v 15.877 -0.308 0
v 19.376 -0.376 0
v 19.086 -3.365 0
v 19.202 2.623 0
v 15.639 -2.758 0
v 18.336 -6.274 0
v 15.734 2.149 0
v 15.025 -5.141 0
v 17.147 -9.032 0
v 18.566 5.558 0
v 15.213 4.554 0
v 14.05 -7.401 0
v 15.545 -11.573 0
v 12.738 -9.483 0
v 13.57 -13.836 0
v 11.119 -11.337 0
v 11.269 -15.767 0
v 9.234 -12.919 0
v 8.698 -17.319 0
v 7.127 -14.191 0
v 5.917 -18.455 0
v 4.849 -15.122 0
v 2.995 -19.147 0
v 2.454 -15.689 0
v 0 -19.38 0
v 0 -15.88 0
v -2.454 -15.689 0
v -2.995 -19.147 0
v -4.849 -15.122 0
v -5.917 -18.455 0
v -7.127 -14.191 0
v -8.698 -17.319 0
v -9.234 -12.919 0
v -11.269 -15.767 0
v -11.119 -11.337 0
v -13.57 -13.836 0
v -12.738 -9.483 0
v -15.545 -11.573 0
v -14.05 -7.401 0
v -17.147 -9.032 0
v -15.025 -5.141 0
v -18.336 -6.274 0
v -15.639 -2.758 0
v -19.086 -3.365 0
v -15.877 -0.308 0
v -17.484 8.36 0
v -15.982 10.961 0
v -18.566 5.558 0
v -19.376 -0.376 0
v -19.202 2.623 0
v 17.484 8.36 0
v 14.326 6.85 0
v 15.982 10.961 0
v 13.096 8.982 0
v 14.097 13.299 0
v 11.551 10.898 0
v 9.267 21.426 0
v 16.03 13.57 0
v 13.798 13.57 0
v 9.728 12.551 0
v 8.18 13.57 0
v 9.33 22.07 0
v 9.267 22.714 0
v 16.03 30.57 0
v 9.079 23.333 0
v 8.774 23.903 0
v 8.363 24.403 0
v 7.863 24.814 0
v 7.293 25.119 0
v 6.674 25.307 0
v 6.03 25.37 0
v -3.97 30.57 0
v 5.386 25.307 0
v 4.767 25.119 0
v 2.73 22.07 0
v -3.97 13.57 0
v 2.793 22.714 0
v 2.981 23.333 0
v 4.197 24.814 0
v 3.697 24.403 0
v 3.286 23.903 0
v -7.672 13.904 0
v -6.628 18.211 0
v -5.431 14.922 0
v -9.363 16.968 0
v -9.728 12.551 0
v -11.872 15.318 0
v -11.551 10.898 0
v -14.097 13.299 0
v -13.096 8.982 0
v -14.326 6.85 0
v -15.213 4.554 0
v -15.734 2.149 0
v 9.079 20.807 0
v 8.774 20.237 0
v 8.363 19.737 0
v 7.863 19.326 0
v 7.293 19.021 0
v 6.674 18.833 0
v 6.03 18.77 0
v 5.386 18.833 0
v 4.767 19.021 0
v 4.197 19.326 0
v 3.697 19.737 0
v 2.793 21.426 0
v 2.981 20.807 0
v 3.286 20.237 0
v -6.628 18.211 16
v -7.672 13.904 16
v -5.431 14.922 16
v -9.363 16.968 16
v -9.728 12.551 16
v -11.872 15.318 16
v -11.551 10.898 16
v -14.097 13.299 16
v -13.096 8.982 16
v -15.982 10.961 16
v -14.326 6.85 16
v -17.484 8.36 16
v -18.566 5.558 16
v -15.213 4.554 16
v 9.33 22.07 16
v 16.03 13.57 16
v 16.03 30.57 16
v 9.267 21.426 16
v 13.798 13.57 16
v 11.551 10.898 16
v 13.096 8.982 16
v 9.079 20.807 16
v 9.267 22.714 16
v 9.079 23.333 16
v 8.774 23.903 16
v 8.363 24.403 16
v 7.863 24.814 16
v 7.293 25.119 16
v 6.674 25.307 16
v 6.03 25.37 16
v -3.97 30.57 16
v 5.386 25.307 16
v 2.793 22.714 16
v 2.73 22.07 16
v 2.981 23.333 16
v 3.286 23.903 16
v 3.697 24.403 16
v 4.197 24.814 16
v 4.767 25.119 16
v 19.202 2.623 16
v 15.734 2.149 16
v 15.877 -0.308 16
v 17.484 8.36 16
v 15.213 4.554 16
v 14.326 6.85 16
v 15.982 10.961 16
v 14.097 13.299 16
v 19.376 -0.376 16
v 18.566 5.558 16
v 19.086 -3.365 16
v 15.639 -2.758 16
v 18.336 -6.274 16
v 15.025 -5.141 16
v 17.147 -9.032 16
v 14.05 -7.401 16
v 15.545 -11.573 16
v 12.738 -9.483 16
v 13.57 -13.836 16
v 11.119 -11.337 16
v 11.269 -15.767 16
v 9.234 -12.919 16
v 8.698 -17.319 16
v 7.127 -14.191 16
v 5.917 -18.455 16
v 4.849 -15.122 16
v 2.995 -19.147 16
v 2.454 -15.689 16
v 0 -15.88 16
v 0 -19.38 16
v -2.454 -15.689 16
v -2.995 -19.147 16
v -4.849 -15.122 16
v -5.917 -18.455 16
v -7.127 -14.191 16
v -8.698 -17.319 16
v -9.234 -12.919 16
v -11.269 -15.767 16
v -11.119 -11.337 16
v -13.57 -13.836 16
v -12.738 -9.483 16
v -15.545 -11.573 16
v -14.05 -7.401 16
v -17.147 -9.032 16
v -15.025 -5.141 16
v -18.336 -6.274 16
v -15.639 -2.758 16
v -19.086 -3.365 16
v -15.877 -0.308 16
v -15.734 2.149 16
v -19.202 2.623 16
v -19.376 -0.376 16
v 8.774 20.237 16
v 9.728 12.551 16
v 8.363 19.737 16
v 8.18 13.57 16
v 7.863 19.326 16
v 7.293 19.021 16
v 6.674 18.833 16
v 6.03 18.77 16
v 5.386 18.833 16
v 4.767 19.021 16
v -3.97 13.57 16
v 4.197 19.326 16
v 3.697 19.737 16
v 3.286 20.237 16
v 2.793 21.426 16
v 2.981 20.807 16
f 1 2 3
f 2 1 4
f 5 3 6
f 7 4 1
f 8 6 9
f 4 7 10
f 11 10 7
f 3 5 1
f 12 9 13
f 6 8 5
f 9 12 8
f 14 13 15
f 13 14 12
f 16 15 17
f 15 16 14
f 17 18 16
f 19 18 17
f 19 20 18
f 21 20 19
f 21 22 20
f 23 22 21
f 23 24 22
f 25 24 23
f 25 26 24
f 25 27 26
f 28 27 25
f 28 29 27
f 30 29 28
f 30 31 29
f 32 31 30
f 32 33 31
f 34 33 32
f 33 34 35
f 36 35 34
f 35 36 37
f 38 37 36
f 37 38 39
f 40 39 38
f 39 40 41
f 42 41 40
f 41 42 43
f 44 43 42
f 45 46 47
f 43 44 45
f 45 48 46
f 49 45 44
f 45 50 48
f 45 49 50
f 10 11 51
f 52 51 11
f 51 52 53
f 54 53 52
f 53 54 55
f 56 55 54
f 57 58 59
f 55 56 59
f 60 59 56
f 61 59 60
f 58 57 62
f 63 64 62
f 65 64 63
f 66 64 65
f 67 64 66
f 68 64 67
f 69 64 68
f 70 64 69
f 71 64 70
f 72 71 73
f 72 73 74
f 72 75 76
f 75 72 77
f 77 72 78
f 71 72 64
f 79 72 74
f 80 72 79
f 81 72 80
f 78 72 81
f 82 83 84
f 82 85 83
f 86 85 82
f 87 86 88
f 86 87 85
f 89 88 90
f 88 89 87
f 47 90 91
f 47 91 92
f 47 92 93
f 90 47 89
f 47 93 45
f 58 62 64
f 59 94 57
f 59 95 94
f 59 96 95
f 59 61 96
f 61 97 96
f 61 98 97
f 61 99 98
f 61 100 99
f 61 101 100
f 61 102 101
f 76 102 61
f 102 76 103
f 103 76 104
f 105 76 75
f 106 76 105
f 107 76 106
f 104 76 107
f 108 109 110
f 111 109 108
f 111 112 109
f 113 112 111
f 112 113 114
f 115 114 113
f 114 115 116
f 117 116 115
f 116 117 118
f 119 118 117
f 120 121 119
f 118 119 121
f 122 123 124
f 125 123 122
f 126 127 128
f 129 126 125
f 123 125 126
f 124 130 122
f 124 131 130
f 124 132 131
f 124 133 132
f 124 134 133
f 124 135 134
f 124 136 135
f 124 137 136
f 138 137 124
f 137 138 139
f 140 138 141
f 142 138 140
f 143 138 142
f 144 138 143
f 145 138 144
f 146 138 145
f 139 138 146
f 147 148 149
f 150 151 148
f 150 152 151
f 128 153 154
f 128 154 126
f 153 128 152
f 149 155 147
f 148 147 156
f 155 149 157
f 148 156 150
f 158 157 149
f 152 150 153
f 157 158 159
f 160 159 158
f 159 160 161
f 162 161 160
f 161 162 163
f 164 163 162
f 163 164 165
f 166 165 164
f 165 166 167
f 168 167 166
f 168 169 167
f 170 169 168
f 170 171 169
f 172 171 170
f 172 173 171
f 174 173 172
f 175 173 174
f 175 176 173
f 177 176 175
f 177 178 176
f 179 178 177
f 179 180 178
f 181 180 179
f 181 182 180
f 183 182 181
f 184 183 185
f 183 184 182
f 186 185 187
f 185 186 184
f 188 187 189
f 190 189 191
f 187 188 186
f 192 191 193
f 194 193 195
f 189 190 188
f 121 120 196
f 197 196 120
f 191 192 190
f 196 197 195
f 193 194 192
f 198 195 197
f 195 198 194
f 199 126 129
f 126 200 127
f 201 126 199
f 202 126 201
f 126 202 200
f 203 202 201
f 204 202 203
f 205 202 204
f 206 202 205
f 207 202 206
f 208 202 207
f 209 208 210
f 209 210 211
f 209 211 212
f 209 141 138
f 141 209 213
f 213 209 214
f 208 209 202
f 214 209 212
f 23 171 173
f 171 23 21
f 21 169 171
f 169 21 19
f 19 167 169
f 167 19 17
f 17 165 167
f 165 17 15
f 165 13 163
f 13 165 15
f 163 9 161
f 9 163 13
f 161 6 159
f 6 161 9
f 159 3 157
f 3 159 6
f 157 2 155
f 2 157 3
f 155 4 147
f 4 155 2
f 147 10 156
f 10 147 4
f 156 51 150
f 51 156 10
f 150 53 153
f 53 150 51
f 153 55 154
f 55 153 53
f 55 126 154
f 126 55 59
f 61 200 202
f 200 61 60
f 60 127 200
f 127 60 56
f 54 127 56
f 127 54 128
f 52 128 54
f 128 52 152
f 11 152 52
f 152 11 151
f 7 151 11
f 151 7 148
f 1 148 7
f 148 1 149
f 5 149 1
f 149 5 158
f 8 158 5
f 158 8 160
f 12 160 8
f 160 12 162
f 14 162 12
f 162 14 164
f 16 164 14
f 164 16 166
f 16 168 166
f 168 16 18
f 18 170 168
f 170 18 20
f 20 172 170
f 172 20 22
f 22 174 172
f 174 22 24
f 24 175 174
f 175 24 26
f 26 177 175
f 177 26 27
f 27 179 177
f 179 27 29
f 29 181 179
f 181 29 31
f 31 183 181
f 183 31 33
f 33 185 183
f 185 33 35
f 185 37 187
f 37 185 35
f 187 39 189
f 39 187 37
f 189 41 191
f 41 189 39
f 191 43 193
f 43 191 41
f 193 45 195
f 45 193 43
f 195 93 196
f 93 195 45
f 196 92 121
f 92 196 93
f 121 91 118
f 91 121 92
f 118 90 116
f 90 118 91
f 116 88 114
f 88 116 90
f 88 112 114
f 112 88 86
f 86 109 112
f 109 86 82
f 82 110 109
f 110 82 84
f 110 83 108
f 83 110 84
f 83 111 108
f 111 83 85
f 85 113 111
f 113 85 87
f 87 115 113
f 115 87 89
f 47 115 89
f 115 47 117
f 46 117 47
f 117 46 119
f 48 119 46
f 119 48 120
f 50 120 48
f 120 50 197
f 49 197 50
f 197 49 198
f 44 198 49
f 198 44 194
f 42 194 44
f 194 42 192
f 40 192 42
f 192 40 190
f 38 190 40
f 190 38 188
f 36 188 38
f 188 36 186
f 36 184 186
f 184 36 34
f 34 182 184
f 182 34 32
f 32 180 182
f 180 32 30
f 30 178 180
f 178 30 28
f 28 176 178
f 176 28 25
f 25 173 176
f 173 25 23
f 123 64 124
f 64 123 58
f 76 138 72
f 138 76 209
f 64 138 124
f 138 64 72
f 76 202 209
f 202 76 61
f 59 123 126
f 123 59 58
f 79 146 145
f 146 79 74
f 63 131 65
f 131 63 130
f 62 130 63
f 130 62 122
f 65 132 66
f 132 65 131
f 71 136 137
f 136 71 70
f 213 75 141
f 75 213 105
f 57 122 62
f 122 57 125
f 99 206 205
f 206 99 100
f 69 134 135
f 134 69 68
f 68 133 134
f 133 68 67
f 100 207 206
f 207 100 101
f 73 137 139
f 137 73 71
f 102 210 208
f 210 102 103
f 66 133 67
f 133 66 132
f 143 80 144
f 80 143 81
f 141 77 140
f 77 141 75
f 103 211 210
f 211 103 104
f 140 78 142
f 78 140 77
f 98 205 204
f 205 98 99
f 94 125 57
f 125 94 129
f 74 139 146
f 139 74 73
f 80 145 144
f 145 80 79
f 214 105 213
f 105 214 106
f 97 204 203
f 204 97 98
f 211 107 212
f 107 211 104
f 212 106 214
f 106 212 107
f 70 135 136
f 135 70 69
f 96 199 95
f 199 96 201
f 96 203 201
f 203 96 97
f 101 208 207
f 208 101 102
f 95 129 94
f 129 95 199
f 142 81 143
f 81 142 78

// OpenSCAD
$fn = 32;

// ----------------------------------------------------------------------
// Pipe clamp: 38.76 mm ring, 3.5 mm wall, 16 mm wide
// ----------------------------------------------------------------------

// --- parameters (mm) ---
outer_r = 19.38;          // clamp outside radius
inner_r = 15.88;          // pipe bore radius
band = 3.5;               // band thickness
clamp_w = 16;             // clamp width
opening = 40;             // opening angle between the ends
lug_w = 20;               // lug width
lug_len = 17;             // lug length
bolt_d = 6.6;             // bolt hole

clamp_profile = [[-6.628, 18.211], [-9.363, 16.968], [-11.872, 15.318], [-14.097, 13.299], [-15.982, 10.961], [-17.484, 8.36], [-18.566, 5.558], [-19.202, 2.623], [-19.376, -0.376], [-19.086, -3.365], [-18.336, -6.274], [-17.147, -9.032], [-15.545, -11.573], [-13.57, -13.836], [-11.269, -15.767], [-8.698, -17.319], [-5.917, -18.455], [-2.995, -19.147], [0, -19.38], [2.995, -19.147], [5.917, -18.455], [8.698, -17.319], [11.269, -15.767], [13.57, -13.836], [15.545, -11.573], [17.147, -9.032], [18.336, -6.274], [19.086, -3.365], [19.376, -0.376], [19.202, 2.623], [18.566, 5.558], [17.484, 8.36], [15.982, 10.961], [14.097, 13.299], [11.872, 15.318], [9.363, 16.968], [6.628, 18.211], [5.431, 14.922], [7.672, 13.904], [9.728, 12.551], [11.551, 10.898], [13.096, 8.982], [14.326, 6.85], [15.213, 4.554], [15.734, 2.149], [15.877, -0.308], [15.639, -2.758], [15.025, -5.141], [14.05, -7.401], [12.738, -9.483], [11.119, -11.337], [9.234, -12.919], [7.127, -14.191], [4.849, -15.122], [2.454, -15.689], [0, -15.88], [-2.454, -15.689], [-4.849, -15.122], [-7.127, -14.191], [-9.234, -12.919], [-11.119, -11.337], [-12.738, -9.483], [-14.05, -7.401], [-15.025, -5.141], [-15.639, -2.758], [-15.877, -0.308], [-15.734, 2.149], [-15.213, 4.554], [-14.326, 6.85], [-13.096, 8.982], [-11.551, 10.898], [-9.728, 12.551], [-7.672, 13.904], [-5.431, 14.922]];

difference() {
  union() {
    linear_extrude(height = clamp_w) polygon(clamp_profile);
    /* bolt lug on the other end */
    translate([-3.97, 13.57, 0]) cube([lug_w, 17, clamp_w]);
  }
  translate([6.03, 22.07, -2.5]) cylinder(h = clamp_w + 5, d = bolt_d);
}
